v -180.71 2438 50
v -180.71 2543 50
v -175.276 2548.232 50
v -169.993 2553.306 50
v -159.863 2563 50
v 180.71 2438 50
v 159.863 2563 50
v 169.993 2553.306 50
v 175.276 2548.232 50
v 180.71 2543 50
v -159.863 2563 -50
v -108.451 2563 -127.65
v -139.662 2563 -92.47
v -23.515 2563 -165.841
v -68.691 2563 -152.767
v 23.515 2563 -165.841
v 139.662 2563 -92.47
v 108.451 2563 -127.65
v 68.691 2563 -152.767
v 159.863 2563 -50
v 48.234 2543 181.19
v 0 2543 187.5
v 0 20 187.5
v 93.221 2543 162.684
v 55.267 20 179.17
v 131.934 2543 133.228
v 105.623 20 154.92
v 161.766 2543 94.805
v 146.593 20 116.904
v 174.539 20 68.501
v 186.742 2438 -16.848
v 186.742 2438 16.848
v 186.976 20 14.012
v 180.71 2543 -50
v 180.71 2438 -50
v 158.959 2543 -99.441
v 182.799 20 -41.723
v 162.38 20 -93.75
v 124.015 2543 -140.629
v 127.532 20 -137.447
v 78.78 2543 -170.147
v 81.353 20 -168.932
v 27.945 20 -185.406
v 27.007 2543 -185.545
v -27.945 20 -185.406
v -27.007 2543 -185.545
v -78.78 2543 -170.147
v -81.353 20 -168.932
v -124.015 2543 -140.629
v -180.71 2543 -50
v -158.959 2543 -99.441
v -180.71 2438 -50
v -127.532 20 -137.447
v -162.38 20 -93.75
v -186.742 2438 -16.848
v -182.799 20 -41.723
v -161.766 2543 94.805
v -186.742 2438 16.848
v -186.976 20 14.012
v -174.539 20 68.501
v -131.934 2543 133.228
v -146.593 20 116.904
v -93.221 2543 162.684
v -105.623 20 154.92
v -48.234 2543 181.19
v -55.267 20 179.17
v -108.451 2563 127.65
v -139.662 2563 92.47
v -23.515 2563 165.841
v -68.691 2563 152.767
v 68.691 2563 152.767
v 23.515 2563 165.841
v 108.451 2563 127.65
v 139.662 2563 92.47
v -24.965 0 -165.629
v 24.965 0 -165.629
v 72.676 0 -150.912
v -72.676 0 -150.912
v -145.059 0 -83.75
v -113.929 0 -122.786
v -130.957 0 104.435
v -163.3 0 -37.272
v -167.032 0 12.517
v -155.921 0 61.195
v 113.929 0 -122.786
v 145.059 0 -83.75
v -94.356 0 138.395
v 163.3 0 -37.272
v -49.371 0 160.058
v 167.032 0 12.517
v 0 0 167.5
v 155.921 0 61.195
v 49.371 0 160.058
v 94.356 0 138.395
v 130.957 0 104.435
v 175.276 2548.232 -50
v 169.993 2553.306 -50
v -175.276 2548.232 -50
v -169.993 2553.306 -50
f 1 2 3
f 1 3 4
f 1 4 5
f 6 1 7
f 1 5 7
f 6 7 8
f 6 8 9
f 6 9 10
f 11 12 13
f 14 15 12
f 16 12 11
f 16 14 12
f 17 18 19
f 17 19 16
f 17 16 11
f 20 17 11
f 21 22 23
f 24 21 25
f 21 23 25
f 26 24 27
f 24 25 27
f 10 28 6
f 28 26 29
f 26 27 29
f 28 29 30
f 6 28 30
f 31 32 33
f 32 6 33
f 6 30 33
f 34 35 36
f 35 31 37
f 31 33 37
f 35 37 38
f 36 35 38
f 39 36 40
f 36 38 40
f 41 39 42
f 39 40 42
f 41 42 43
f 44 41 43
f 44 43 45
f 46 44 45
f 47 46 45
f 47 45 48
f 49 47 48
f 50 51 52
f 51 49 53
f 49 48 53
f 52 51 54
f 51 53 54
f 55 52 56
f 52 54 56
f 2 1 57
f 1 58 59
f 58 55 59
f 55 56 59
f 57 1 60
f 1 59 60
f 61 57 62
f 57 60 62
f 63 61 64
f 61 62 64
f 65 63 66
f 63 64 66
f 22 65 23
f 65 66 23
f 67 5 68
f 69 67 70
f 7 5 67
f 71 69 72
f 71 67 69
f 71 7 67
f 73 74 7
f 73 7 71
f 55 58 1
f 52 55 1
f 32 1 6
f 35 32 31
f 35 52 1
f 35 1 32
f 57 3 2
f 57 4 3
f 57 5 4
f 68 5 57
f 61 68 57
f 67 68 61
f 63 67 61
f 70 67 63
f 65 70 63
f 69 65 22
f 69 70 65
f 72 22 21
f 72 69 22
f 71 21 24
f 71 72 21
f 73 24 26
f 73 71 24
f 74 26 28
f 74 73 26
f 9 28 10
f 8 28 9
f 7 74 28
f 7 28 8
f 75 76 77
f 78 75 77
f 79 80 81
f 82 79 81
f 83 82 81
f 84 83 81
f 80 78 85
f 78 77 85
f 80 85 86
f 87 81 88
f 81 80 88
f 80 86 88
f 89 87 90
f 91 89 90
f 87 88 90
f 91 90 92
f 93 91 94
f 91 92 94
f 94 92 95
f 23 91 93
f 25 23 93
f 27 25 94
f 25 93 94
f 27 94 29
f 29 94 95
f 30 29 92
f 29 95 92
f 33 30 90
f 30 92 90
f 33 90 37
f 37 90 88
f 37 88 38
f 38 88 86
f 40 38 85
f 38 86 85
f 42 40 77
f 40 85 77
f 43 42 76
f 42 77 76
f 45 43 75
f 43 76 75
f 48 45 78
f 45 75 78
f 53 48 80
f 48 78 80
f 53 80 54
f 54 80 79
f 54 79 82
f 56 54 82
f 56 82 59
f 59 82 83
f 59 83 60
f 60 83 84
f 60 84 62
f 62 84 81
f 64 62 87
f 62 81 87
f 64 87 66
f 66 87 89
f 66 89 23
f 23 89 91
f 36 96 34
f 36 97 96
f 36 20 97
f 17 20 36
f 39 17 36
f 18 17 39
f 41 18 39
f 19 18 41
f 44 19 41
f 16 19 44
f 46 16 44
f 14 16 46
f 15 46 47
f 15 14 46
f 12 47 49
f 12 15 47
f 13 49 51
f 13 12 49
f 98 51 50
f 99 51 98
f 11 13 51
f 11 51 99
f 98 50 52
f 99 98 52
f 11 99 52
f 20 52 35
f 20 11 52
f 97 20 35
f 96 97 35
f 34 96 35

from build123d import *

# Parameters (mm, degrees)
SKETCH1_R           = 187.5
BOSS_EXTRUDE1_DEPTH = 2563
SKETCH2_W           = 375
SKETCH2_H           = 100
CUT_EXTRUDE1_DEPTH  = 125
CHAMFER1_SIZE       = 20
CHAMFER2_SIZE       = 20


with BuildPart() as part:
    # Sketch1 → Boss-Extrude1 (new body)
    with BuildSketch(Plane(origin=(0, 0, 0), x_dir=(1, 0, 0), z_dir=(0, 1, 0))):
        with Locations(Location((0, 0, 0), (0, 0, 270))):
            Circle(SKETCH1_R)
    extrude(amount=BOSS_EXTRUDE1_DEPTH)

    # Sketch2 → Cut-Extrude1 (cut)
    with BuildSketch(Plane(origin=(0, 2563, 0), x_dir=(1, 0, 0), z_dir=(0, 1, 0))):
        Rectangle(SKETCH2_W, SKETCH2_H)
    extrude(amount=-CUT_EXTRUDE1_DEPTH, mode=Mode.SUBTRACT)

    # Chamfer1
    chamfer1_edges = [part.edges().sort_by_distance(p)[0] for p in [
        (0, 2563, -187.5),
        (113.536888279, 2563, 149.216704829),
    ]]
    chamfer(chamfer1_edges, length=CHAMFER1_SIZE)

    # Chamfer2
    chamfer2_edges = [part.edges().sort_by_distance(p)[0] for p in [
        (0, 0, -187.5),
    ]]
    chamfer(chamfer2_edges, length=CHAMFER2_SIZE)


solid = part.part
